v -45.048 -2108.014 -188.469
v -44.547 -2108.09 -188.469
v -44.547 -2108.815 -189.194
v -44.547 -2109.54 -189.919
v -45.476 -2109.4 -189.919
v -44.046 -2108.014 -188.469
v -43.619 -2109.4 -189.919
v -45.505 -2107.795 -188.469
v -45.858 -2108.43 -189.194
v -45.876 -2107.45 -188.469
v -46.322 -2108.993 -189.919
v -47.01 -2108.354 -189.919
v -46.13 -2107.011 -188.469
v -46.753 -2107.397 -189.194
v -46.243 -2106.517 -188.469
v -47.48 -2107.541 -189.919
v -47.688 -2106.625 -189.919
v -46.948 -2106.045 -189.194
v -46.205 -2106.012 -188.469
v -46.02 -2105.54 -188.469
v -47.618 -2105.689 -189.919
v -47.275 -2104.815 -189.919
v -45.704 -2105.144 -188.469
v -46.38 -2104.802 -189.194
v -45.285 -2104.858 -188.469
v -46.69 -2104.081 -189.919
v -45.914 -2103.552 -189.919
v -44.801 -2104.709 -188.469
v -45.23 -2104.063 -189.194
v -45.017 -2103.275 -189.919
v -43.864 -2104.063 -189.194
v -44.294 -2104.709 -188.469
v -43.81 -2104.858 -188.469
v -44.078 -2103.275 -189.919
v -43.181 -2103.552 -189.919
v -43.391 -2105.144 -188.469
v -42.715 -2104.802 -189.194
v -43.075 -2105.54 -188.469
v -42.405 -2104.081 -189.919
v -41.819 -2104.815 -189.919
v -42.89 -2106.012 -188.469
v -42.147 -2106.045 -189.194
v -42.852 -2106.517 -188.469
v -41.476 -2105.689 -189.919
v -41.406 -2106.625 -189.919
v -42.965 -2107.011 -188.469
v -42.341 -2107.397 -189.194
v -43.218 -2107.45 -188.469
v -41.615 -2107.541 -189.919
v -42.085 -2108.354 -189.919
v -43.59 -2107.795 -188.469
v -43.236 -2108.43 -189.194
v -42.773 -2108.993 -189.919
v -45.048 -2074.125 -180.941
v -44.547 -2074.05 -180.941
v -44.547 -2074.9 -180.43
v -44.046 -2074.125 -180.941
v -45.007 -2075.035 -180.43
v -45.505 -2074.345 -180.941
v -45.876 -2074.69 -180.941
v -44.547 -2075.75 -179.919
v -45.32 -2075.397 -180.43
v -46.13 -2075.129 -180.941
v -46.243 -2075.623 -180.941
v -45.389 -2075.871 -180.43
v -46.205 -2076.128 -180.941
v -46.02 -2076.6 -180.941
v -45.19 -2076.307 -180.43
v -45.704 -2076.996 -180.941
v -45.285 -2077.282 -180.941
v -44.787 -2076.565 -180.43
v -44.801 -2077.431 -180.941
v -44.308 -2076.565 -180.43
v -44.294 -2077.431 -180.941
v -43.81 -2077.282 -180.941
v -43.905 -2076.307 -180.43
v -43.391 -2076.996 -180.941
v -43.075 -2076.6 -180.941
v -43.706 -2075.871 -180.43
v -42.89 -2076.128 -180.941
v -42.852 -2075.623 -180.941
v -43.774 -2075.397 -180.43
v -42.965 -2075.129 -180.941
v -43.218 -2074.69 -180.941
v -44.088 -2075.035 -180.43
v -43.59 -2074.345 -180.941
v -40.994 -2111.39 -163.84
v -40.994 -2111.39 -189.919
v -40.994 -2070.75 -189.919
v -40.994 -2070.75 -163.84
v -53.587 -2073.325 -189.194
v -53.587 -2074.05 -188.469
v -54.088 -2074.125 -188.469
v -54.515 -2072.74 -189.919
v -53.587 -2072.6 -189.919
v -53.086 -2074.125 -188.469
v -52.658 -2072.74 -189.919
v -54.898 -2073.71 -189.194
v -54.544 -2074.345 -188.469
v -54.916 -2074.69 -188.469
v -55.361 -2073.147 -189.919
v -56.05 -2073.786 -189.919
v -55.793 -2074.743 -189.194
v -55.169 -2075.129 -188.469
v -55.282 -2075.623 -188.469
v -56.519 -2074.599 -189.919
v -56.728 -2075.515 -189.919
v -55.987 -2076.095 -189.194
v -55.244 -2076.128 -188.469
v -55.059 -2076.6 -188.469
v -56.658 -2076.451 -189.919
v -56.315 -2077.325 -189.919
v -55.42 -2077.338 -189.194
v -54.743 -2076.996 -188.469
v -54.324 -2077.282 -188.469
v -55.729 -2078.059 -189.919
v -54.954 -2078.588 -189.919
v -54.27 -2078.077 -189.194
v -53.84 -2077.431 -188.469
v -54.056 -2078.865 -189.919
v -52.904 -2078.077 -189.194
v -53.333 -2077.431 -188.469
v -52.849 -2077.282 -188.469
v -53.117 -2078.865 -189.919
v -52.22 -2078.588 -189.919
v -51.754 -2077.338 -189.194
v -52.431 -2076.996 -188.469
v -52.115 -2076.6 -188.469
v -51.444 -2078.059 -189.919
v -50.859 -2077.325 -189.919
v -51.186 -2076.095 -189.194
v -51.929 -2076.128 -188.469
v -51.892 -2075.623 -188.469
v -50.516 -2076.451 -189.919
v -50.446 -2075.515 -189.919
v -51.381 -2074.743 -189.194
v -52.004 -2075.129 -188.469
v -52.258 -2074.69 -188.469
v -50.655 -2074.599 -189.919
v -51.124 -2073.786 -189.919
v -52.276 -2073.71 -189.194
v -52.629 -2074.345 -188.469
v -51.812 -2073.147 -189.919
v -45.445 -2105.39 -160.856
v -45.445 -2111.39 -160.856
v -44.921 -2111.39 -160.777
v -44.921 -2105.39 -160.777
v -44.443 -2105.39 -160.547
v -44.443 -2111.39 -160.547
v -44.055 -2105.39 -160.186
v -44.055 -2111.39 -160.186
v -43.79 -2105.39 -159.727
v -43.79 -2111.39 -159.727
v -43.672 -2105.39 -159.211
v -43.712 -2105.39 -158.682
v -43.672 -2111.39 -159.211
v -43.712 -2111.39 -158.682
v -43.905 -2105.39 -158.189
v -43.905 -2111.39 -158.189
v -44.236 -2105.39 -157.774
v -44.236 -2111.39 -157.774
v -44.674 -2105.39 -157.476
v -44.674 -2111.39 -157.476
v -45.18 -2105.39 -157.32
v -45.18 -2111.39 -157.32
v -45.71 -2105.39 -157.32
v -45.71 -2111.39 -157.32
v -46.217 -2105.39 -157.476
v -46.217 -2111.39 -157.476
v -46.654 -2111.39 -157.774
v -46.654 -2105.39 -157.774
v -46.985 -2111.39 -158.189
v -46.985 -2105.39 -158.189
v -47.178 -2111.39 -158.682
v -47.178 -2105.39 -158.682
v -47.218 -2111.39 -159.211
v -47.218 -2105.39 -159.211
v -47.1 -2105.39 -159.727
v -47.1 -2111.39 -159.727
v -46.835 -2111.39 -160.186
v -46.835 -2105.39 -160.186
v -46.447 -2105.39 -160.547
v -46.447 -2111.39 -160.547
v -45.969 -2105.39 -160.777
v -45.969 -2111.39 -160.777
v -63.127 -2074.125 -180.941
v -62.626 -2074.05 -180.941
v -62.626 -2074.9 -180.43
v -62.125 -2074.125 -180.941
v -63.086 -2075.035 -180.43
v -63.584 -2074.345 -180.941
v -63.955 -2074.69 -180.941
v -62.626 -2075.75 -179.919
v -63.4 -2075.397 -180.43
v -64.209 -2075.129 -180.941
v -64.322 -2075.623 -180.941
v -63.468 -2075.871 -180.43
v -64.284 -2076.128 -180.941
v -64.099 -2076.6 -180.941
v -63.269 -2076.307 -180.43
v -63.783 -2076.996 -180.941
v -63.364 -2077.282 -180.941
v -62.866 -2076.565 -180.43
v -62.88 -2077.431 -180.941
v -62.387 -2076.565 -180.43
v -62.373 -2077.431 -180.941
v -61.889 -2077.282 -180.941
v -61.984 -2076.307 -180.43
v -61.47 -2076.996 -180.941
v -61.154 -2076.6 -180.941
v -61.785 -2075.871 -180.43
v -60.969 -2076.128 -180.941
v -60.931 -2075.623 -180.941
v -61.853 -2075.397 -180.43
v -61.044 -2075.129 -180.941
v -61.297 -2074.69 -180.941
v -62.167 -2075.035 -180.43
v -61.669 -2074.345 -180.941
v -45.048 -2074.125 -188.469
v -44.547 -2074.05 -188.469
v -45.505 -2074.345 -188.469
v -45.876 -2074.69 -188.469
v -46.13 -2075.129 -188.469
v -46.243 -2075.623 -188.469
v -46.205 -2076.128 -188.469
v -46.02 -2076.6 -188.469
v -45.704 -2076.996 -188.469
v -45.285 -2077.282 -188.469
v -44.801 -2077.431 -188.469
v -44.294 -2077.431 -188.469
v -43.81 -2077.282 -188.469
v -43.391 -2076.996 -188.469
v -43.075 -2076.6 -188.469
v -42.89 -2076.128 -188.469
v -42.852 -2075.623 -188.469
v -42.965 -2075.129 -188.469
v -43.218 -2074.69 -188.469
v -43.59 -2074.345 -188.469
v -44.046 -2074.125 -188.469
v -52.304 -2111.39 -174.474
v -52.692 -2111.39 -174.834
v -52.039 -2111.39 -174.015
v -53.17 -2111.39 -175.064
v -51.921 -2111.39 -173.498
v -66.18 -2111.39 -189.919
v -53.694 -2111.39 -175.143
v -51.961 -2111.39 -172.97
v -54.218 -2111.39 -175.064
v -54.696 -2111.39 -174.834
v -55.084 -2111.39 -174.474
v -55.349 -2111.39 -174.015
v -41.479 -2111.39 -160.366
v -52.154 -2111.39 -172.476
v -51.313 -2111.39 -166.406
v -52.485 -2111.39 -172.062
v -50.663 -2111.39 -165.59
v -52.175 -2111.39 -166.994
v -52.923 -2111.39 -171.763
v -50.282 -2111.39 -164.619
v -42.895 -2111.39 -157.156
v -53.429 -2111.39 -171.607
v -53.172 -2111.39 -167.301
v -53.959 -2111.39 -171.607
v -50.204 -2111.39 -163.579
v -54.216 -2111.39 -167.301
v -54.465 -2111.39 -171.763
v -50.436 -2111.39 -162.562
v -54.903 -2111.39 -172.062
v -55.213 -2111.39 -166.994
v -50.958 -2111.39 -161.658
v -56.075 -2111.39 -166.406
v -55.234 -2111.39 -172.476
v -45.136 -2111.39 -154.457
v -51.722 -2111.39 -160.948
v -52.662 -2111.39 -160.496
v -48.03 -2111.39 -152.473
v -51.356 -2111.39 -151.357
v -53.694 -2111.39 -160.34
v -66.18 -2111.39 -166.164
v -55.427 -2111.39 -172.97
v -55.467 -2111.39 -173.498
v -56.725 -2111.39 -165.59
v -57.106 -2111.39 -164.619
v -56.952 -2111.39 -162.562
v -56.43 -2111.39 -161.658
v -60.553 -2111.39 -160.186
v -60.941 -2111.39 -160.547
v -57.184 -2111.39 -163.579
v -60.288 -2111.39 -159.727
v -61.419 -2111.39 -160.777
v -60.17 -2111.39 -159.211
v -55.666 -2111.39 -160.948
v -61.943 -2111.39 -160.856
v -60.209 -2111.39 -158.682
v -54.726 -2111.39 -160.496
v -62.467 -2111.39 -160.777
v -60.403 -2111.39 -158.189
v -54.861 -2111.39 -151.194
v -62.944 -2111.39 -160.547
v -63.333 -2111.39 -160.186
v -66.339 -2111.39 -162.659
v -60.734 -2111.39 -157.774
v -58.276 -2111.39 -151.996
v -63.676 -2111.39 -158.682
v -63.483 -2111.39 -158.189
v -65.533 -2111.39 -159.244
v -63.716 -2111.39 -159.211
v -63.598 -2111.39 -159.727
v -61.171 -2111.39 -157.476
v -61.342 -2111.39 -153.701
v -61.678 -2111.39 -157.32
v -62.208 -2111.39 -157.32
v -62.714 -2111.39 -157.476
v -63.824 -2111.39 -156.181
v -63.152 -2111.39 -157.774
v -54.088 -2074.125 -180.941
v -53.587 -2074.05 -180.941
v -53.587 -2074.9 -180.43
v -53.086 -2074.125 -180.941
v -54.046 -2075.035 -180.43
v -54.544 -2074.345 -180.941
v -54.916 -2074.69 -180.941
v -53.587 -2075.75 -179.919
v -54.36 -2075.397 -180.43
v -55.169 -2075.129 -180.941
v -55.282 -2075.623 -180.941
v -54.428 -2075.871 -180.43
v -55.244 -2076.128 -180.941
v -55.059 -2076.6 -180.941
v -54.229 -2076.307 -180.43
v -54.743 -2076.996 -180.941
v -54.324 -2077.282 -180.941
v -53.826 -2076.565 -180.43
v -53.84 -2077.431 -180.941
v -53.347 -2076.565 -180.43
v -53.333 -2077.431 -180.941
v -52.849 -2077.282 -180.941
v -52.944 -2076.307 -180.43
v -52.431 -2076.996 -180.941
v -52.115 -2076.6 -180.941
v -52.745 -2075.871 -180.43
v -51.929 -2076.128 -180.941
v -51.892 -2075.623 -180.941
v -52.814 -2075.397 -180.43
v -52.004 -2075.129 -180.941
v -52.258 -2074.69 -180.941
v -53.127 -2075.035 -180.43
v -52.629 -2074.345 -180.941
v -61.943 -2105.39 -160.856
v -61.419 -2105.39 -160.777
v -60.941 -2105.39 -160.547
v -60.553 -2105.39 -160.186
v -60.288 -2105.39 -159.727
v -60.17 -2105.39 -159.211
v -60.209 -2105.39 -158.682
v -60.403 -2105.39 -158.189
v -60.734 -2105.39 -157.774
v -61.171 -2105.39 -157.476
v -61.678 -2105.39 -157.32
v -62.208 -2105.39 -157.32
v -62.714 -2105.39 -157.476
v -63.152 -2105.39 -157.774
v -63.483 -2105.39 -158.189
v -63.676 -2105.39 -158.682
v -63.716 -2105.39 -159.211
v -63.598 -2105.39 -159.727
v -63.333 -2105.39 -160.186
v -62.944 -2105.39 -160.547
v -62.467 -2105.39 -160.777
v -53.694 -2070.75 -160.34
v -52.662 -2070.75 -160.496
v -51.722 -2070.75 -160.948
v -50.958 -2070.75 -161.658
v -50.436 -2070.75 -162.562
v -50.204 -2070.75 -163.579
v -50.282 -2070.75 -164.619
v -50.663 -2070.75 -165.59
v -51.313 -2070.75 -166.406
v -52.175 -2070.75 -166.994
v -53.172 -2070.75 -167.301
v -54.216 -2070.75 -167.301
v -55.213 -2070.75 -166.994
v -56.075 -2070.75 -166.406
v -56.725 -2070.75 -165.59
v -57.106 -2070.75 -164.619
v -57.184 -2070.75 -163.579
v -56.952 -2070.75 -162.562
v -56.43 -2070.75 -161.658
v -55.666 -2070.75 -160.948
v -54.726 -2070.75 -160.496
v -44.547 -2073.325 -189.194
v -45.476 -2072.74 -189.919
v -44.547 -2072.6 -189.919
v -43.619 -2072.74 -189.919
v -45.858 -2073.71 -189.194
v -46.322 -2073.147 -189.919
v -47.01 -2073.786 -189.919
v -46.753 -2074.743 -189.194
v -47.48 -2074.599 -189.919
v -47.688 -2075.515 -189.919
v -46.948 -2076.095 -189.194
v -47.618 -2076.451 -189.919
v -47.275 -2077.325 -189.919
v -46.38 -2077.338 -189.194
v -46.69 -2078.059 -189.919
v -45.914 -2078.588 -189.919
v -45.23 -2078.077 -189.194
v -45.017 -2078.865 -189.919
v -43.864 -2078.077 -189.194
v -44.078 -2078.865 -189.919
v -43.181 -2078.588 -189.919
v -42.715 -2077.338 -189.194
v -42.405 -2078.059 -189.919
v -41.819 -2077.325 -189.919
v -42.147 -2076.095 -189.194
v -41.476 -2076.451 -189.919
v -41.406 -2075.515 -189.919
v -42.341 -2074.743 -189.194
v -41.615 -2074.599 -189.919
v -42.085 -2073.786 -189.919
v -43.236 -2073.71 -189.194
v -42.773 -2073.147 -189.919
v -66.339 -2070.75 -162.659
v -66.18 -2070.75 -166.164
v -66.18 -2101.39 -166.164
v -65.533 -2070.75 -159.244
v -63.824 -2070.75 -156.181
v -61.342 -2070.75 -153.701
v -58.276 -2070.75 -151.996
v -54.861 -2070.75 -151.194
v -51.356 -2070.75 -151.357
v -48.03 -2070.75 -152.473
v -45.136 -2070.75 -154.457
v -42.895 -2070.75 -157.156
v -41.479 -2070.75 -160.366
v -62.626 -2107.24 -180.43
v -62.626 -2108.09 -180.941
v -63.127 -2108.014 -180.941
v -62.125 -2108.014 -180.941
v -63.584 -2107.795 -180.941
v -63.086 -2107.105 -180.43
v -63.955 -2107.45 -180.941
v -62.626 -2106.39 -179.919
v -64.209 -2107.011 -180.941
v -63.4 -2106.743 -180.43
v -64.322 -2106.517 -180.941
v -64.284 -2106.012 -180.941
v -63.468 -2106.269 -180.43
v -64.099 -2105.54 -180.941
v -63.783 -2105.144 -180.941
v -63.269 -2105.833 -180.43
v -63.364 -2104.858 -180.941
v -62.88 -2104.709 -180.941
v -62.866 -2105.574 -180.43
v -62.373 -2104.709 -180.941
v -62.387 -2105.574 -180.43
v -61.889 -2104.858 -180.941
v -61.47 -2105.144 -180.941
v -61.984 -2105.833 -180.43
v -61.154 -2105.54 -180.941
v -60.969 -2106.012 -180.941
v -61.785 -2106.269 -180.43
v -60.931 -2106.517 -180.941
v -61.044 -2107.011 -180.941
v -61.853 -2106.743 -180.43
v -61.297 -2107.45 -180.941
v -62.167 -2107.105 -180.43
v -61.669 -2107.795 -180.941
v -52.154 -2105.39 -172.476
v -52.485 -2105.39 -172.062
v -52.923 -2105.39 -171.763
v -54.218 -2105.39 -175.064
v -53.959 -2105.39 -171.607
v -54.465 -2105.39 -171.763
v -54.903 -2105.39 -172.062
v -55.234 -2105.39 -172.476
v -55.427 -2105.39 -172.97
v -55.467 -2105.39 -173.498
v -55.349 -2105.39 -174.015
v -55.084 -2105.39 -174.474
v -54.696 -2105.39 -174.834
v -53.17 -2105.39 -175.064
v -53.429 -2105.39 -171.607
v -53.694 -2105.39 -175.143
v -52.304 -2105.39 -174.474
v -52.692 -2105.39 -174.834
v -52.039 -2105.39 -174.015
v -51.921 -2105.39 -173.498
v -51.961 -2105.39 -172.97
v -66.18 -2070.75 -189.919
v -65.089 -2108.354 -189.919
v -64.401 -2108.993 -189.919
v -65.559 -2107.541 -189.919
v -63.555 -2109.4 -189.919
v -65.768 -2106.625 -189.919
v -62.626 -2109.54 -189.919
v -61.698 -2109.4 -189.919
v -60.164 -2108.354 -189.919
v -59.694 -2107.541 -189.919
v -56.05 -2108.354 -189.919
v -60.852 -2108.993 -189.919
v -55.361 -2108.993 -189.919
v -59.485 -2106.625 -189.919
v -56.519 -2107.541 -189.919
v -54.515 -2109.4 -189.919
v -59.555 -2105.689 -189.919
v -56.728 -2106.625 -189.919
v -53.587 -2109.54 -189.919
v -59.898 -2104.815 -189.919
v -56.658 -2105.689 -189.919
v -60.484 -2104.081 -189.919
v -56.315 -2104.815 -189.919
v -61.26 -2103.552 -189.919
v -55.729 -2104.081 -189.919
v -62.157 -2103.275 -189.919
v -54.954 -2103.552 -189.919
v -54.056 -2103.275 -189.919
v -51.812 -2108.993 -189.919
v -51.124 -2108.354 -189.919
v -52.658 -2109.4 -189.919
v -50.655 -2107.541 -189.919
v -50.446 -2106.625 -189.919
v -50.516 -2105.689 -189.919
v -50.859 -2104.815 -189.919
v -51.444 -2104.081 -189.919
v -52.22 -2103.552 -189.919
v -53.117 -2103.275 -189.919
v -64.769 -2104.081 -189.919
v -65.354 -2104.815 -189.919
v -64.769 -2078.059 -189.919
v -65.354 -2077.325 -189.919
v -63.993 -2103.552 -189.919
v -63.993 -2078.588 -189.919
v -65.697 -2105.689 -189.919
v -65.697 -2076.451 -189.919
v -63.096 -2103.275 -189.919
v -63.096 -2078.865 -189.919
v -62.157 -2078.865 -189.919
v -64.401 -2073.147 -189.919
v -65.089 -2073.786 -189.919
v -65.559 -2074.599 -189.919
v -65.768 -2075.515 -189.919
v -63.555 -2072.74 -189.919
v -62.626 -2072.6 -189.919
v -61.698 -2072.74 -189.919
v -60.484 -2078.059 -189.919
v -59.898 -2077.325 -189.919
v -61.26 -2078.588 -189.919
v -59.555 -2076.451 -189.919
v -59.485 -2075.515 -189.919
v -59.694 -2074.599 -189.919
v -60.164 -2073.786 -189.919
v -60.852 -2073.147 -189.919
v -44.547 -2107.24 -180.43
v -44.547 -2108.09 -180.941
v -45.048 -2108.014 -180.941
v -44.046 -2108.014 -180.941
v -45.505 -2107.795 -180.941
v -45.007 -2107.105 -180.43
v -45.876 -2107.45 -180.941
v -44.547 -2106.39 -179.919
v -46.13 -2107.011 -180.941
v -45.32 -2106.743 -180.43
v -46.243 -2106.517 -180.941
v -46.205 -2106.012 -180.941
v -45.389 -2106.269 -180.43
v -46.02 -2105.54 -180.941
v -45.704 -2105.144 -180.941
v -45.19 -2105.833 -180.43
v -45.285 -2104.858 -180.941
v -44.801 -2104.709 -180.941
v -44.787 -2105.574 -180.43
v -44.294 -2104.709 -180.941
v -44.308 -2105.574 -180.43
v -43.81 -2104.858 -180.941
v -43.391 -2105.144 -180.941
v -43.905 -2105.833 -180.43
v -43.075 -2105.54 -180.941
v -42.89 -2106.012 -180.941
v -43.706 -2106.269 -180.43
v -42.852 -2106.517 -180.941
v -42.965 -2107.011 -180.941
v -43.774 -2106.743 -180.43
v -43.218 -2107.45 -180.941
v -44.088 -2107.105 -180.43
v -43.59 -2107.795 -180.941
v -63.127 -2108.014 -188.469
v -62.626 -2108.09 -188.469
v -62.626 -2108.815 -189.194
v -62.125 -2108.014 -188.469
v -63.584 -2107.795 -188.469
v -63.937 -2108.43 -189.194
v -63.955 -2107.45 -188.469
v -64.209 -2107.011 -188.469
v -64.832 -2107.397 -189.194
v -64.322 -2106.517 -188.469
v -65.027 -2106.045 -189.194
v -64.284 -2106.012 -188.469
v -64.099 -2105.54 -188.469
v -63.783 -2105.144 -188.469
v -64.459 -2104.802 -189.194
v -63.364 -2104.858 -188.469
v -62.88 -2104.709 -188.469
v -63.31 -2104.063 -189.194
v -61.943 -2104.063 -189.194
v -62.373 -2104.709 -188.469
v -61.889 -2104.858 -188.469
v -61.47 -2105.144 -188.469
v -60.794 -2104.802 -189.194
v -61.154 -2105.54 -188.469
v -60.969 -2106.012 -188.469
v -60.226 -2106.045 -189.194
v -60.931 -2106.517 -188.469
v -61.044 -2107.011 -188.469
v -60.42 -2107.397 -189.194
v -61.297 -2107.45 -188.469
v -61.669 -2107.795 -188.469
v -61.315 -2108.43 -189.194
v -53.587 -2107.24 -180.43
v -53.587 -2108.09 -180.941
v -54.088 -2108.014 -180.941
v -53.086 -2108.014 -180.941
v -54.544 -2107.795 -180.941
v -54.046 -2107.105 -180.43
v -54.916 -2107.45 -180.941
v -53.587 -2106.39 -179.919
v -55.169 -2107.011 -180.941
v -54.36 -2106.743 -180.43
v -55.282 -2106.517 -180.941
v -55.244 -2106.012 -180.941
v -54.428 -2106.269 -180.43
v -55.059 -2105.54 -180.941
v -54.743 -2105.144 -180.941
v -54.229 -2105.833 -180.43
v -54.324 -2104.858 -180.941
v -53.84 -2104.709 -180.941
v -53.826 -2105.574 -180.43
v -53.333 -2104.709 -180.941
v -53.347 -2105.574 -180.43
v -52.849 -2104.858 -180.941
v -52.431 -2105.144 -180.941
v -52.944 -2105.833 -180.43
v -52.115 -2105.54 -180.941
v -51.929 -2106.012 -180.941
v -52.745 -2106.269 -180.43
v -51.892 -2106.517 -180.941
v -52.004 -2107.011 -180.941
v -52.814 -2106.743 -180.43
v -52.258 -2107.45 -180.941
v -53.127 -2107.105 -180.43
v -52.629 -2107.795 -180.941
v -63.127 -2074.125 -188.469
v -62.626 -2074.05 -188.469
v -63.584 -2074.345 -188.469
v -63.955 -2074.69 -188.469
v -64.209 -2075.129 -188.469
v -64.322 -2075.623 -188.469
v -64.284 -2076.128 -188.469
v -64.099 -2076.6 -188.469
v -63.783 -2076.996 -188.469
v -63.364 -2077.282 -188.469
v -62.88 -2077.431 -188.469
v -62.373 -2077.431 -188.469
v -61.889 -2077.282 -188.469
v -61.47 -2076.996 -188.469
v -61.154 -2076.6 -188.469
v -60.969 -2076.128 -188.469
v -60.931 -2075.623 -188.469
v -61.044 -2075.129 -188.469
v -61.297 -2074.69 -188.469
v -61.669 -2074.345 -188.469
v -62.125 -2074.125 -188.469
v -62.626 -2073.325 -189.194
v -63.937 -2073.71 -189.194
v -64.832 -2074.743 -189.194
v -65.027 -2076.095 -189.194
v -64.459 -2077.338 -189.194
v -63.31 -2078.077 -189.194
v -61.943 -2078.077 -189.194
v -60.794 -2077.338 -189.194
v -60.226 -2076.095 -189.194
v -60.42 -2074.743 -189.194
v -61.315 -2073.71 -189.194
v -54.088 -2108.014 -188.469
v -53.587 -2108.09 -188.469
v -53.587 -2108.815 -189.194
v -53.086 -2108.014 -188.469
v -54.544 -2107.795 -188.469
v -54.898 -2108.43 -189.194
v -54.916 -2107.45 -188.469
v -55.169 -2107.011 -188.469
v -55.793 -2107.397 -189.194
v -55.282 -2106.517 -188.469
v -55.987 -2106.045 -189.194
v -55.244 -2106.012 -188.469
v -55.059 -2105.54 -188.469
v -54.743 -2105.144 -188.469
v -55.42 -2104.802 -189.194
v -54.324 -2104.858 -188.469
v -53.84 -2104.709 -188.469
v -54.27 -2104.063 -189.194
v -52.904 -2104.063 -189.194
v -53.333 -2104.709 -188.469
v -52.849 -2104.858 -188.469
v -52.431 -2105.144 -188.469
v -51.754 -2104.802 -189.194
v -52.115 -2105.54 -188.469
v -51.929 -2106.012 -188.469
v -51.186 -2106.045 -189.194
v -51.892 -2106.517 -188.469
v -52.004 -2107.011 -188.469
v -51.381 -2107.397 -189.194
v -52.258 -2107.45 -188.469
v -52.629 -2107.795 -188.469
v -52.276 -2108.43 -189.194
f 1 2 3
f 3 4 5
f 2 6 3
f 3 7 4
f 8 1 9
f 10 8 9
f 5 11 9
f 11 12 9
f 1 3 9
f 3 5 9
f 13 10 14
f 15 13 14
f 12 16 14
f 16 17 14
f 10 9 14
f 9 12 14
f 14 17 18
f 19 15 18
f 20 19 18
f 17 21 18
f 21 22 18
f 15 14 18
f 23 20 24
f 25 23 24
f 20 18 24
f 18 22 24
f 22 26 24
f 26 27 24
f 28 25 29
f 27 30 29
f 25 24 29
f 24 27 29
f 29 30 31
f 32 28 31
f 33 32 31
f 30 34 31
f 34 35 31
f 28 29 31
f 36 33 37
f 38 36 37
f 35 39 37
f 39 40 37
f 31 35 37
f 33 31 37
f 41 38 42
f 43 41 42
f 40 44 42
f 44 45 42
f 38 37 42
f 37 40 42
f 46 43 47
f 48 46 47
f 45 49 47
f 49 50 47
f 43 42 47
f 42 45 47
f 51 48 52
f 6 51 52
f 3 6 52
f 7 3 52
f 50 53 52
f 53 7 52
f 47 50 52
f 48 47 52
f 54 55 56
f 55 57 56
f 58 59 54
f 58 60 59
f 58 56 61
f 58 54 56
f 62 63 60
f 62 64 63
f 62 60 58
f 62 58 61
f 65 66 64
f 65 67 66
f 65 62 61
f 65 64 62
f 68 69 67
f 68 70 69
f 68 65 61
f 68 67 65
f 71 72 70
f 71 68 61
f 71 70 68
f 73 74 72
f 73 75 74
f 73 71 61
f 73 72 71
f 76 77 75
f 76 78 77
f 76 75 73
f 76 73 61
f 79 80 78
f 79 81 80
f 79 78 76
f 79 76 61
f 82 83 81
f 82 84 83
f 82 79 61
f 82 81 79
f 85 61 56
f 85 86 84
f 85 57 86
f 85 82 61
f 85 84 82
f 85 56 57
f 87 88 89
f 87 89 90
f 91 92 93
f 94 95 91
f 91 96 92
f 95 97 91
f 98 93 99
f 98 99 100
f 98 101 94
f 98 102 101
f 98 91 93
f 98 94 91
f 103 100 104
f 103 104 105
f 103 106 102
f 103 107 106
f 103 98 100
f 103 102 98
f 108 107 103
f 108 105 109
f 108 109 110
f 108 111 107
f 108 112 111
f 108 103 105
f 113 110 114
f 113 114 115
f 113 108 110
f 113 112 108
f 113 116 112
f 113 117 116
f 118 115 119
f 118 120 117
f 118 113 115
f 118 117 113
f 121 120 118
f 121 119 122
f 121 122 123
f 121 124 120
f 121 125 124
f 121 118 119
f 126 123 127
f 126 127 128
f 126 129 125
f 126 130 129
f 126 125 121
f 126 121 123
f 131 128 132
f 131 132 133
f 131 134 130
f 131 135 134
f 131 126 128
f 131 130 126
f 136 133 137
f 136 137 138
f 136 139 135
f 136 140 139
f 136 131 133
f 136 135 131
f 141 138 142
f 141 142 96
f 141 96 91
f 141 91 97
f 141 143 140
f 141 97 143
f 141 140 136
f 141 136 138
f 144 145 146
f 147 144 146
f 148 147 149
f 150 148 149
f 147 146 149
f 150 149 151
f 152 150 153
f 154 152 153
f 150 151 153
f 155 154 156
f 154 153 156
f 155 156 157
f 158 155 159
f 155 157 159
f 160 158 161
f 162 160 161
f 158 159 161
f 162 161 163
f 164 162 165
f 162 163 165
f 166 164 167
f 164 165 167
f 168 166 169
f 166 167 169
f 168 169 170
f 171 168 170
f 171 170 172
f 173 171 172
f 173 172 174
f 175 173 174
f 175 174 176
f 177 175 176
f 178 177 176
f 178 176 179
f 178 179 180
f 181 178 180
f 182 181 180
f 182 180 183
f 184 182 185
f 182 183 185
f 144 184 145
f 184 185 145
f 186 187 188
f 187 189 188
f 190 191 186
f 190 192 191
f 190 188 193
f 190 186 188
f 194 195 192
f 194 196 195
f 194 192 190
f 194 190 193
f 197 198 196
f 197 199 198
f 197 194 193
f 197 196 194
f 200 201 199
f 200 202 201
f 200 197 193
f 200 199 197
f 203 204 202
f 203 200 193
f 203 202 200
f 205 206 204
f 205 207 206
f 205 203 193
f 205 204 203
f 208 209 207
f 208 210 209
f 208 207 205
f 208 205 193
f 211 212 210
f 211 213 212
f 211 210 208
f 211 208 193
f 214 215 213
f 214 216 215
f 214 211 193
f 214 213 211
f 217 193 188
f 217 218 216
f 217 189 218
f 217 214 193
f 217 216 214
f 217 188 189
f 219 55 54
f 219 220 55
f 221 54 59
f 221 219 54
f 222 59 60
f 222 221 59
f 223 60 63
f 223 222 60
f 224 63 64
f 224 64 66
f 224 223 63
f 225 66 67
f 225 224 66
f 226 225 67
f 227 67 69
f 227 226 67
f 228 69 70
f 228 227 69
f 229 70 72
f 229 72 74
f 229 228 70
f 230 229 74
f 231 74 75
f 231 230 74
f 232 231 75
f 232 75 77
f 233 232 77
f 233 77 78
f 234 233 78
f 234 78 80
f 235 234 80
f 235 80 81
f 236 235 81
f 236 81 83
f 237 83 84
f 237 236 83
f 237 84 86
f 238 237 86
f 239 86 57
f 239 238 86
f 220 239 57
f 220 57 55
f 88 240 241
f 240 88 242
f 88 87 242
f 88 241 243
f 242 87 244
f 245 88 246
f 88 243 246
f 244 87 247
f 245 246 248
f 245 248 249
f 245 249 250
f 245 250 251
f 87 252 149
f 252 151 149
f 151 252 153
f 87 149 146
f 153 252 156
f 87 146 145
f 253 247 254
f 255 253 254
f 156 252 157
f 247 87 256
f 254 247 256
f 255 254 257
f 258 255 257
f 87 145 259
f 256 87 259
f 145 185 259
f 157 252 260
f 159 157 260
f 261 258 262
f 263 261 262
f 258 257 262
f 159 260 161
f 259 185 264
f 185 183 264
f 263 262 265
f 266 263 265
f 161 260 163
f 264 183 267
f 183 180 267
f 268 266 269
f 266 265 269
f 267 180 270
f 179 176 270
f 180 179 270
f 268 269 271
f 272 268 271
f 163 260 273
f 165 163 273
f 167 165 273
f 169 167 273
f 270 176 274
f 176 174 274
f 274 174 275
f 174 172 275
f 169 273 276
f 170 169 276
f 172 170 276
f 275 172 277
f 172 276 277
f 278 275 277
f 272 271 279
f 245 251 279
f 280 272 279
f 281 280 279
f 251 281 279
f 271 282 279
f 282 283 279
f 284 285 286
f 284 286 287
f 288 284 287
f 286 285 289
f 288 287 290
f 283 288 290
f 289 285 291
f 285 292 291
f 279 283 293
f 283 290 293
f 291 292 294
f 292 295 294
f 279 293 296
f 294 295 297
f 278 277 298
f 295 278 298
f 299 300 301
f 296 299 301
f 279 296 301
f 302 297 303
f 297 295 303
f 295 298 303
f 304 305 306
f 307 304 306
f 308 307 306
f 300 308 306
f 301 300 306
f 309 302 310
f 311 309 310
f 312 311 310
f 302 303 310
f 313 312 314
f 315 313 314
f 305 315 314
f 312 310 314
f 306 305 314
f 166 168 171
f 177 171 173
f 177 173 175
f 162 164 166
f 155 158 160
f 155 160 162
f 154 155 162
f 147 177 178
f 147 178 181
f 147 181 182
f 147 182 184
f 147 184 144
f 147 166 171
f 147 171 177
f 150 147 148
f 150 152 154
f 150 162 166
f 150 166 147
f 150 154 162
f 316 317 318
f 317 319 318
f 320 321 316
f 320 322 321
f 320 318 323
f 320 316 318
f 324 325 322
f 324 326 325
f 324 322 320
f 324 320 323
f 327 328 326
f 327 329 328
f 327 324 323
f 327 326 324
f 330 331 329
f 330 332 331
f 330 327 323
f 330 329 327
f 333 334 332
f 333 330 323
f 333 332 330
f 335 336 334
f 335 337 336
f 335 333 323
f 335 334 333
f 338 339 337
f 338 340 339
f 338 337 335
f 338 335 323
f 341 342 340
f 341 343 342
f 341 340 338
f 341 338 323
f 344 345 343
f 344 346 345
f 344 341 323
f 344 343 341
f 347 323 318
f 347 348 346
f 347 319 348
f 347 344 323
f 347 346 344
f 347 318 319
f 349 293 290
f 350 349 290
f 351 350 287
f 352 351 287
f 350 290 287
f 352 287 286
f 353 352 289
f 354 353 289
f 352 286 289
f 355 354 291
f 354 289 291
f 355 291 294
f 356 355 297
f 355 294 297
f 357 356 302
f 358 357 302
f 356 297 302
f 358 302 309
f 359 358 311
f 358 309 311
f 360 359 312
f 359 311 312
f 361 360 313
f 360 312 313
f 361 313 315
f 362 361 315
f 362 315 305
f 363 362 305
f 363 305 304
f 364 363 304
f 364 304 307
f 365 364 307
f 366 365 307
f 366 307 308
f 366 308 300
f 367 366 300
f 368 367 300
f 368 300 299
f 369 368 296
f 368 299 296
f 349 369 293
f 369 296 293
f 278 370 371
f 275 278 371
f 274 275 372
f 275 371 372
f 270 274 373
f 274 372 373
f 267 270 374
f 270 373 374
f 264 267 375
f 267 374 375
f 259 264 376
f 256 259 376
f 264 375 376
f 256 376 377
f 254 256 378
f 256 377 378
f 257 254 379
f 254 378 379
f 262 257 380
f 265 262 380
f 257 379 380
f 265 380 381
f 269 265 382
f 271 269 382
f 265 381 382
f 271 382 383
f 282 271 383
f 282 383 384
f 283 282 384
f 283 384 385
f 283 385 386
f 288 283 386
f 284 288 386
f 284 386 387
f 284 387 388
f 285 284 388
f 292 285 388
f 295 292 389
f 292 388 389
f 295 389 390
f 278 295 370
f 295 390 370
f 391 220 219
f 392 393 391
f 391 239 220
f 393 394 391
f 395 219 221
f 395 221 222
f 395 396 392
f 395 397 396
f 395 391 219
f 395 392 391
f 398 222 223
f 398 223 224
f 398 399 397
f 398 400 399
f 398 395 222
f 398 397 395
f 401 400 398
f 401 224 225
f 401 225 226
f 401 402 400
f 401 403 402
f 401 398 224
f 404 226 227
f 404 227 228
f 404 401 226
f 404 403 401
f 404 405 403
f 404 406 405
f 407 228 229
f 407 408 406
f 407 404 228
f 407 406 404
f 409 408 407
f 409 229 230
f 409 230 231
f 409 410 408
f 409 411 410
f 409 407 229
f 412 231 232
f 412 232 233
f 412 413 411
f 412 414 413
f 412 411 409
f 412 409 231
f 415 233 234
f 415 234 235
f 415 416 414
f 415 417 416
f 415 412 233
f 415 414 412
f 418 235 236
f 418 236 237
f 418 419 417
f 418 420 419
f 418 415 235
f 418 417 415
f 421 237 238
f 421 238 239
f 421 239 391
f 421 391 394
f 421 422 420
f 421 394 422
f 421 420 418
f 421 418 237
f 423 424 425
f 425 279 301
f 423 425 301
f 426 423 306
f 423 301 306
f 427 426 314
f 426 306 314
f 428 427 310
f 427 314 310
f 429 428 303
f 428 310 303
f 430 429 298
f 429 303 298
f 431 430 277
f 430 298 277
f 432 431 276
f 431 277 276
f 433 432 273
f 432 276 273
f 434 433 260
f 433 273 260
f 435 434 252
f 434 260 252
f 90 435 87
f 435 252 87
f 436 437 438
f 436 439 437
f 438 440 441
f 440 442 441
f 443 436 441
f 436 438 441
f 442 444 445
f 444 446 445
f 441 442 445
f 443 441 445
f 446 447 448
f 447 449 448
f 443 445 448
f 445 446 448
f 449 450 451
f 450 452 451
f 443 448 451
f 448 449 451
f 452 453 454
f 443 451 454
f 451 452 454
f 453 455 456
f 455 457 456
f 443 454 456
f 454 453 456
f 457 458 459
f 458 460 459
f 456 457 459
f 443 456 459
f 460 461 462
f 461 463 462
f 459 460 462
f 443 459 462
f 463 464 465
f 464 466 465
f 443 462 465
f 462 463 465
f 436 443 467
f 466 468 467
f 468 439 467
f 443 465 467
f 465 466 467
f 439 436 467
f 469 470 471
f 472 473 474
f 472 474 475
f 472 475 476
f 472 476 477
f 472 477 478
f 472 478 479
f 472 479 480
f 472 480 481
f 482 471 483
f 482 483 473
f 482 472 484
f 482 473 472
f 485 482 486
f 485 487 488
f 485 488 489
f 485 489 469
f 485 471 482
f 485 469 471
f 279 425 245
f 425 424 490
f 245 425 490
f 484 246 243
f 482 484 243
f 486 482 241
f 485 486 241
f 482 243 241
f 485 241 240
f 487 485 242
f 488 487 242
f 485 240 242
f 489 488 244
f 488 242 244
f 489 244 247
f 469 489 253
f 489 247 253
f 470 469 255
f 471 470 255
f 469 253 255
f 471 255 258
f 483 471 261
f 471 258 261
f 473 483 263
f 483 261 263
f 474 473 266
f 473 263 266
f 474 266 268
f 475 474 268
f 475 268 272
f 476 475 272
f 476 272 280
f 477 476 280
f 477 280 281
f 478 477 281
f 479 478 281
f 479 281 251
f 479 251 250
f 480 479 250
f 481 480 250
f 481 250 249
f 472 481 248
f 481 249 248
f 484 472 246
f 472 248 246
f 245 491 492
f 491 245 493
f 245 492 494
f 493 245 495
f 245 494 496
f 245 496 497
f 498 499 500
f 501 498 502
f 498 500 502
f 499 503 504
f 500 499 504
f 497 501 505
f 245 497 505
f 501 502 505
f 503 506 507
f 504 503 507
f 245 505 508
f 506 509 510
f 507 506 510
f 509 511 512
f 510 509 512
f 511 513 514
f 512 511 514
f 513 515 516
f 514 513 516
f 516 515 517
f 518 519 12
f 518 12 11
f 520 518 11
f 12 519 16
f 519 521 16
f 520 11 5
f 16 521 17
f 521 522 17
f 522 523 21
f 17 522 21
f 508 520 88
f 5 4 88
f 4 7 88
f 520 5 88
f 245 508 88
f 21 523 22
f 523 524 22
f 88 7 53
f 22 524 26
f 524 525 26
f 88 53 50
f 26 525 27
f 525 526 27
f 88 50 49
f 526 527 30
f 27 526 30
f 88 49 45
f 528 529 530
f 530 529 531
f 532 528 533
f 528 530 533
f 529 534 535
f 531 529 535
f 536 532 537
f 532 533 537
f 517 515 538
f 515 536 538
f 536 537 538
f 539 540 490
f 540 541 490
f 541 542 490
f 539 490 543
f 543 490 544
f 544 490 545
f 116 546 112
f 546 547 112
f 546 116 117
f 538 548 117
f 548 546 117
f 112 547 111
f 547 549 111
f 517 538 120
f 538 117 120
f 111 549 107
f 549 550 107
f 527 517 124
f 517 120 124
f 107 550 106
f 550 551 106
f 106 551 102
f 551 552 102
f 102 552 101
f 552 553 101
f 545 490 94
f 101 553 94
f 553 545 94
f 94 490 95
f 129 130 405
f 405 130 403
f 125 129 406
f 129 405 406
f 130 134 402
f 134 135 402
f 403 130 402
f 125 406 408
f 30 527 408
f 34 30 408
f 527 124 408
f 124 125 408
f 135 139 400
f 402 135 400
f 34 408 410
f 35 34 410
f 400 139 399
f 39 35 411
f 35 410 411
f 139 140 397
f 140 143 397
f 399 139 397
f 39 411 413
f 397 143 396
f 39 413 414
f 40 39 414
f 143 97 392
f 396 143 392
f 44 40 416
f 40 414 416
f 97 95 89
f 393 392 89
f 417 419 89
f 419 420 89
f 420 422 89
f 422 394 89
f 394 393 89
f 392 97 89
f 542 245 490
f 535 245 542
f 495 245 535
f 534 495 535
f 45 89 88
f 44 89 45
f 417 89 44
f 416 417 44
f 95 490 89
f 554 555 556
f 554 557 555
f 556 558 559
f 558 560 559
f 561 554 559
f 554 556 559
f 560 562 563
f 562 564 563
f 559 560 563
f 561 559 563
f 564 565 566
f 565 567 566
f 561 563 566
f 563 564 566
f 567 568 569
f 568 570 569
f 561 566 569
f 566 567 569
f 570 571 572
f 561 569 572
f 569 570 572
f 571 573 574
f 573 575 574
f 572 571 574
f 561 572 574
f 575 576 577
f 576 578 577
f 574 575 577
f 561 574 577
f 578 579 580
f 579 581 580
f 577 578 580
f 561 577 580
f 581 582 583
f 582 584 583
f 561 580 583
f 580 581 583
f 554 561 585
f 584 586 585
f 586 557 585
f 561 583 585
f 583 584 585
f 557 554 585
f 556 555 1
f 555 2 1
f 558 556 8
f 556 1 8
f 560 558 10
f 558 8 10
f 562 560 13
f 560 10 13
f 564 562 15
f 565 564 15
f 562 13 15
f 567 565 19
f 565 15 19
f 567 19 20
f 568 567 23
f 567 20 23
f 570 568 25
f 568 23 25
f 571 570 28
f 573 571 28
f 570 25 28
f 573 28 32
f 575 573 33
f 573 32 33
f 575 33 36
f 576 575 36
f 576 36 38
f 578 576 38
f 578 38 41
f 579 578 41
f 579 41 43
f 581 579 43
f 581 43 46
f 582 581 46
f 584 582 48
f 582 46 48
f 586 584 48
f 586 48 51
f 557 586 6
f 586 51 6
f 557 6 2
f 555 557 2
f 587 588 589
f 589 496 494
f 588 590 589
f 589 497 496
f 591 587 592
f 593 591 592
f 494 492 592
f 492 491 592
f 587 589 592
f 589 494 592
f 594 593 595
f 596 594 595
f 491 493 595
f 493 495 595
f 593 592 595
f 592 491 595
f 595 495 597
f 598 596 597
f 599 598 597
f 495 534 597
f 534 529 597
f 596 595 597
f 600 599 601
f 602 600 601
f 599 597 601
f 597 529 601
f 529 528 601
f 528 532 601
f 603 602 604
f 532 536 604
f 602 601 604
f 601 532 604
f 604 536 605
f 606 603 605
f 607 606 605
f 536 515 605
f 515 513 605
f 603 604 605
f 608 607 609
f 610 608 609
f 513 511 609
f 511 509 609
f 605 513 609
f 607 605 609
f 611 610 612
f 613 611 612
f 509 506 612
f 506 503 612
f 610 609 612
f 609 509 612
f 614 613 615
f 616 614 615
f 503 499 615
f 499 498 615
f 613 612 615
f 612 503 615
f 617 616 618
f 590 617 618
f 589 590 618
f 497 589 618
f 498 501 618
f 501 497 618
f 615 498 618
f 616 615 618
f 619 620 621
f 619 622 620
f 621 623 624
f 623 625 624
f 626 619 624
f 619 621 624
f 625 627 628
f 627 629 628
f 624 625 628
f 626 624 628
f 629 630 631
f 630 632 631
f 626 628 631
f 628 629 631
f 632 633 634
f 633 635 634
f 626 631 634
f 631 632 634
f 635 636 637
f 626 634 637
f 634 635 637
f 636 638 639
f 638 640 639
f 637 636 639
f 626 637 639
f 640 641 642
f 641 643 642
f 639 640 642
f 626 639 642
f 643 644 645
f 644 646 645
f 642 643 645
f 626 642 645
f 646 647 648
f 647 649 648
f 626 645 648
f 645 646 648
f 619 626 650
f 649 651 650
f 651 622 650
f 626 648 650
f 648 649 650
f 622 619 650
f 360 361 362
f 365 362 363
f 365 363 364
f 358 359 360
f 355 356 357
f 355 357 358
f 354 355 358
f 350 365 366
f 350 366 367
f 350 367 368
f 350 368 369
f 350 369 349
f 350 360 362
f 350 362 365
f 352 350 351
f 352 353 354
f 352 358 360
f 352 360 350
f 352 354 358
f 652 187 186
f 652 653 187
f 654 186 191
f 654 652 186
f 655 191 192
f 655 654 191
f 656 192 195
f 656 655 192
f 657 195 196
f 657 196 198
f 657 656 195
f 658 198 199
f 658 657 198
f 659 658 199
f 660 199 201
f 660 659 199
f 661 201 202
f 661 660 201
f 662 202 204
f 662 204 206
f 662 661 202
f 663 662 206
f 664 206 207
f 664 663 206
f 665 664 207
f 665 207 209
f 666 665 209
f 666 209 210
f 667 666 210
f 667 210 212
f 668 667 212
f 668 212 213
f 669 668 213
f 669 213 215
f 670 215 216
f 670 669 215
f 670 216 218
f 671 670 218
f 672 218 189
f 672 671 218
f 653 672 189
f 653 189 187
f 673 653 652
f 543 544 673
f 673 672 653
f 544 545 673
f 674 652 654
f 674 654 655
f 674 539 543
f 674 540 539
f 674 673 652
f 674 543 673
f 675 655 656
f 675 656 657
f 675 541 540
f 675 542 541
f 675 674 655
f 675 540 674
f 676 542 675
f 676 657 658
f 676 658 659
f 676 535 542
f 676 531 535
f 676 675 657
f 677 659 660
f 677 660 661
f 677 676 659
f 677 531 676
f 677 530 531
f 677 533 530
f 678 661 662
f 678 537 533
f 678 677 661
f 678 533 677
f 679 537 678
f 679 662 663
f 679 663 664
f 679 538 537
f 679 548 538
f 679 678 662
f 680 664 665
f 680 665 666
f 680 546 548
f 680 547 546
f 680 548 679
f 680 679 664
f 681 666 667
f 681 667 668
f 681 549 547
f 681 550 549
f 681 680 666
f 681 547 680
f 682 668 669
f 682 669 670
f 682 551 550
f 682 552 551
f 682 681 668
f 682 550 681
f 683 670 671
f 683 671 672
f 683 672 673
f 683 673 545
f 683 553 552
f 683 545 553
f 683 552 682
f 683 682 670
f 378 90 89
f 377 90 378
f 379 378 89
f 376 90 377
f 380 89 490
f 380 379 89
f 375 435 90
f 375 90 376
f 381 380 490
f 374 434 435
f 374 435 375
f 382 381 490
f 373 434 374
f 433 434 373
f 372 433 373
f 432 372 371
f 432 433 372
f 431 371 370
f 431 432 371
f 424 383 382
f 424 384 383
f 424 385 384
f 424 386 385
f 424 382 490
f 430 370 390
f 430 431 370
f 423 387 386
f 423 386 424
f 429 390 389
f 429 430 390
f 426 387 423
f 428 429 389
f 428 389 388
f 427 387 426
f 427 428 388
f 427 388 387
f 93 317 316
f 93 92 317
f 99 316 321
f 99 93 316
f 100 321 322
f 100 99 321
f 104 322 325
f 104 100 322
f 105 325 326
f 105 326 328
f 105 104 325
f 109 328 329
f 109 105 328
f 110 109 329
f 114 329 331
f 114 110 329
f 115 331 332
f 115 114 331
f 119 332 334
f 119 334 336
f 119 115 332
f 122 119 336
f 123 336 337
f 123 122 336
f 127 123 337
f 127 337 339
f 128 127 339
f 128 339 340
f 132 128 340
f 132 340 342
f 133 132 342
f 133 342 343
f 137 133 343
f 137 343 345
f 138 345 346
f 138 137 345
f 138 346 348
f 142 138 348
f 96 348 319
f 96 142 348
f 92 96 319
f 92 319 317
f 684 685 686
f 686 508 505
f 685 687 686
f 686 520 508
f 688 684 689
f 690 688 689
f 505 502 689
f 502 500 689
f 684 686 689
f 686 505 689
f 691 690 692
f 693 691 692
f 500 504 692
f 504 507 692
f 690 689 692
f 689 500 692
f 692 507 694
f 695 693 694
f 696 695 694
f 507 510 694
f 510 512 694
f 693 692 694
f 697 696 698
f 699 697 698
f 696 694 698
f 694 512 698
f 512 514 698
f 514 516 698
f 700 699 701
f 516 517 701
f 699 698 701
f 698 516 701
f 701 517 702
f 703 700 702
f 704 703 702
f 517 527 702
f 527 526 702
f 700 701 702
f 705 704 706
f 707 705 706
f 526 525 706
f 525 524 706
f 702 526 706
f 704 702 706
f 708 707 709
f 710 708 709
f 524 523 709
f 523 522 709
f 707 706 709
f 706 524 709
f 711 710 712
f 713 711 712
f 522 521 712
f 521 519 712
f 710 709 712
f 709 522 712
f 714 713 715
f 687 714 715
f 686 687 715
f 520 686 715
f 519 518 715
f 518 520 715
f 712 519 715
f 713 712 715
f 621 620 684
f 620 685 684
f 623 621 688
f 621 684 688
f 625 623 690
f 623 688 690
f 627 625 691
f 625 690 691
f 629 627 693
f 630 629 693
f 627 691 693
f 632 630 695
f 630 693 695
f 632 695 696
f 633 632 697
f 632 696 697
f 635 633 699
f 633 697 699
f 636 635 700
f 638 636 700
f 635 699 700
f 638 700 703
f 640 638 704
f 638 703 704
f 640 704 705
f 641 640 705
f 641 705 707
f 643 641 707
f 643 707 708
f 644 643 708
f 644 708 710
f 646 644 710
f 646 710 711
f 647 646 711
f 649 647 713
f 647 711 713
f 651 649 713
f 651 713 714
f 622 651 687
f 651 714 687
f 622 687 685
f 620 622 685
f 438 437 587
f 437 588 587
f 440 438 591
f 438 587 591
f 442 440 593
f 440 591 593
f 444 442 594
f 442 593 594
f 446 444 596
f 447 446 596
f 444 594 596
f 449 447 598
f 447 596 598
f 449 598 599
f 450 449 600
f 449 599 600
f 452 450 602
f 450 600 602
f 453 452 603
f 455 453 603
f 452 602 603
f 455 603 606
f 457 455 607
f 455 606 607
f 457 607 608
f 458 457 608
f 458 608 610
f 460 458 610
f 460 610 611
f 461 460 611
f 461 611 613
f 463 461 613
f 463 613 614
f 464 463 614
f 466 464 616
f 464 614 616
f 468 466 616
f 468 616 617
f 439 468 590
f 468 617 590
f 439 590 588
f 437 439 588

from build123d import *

# Parameters (mm, degrees)
SKETCH2_R                                      = 12.7
BOSS_EXTRUDE6_DEPTH                            = 40.64
SKETCH3_R                                      = 3.5
CUT_EXTRUDE1_DEPTH                             = 40.64
SKETCH4_R                                      = 1.778
CUT_EXTRUDE2_DEPTH                             = 6
BOSS_EXTRUDE8_DEPTH                            = 10
SKETCH8_W                                      = 25.185693912
SKETCH8_H                                      = 10
BOSS_EXTRUDE9_DEPTH                            = 7.284789049
BOSS_EXTRUDE10_DEPTH                           = 30.64
CSK_FOR_M3_FLAT_HEAD_MACHINE_SCREW1_AT_2_COUNT = 2
CSK_FOR_M3_FLAT_HEAD_MACHINE_SCREW1_AT_2_PITCH = 9.039543014
CSK_FOR_M3_FLAT_HEAD_MACHINE_SCREW1_AT_3_COUNT = 2
CSK_FOR_M3_FLAT_HEAD_MACHINE_SCREW1_AT_3_PITCH = 9.039543014


with BuildPart() as part:
    # Sketch2 → Boss-Extrude6 (new body)
    with BuildSketch(Plane(origin=(0, -2111.389926236, 0), x_dir=(1, 0, 0), z_dir=(0, 1, 0))):
        with Locations(Location((-53.693967541, 163.840329354, 0), (0, 0, 180))):
            Circle(SKETCH2_R)
    extrude(amount=BOSS_EXTRUDE6_DEPTH)

    # Sketch3 → Cut-Extrude1 (cut)
    with BuildSketch(Plane(origin=(0, -2070.749926236, 0), x_dir=(1, 0, 0), z_dir=(0, 1, 0))):
        with Locations(Location((-53.693967541, 163.840329354, 0), (0, 0, 270))):
            Circle(SKETCH3_R)
    extrude(amount=-CUT_EXTRUDE1_DEPTH, mode=Mode.SUBTRACT)

    # Sketch4 → Cut-Extrude2 (cut)
    with BuildSketch(Plane.XZ.offset(2111.389926236)):
        with Locations(Location((-61.942859512, -159.077829354, 0), (0, 0, 270))):
            Circle(SKETCH4_R)
        with Locations(Location((-53.693967541, -173.365329354, 0), (0, 0, 270))):
            Circle(SKETCH4_R)
        with Locations(Location((-45.44507557, -159.077829354, 0), (0, 0, 270))):
            Circle(SKETCH4_R)
    extrude(amount=-CUT_EXTRUDE2_DEPTH, mode=Mode.SUBTRACT)

    # Sketch7 → Boss-Extrude8 (add)
    with BuildSketch(Plane.XZ.offset(2111.389926236)):
        with BuildLine():
            Line((-40.993967541, -163.840329354), (-40.993967541, -182.634287878))
            Line((-40.993967541, -182.634287878), (-66.179661453, -182.634287878))
            Line((-66.179661453, -182.634287878), (-66.179661453, -166.163570095))
            ThreePointArc((-66.179661453, -166.163570095), (-52.527415502, -176.486639343), (-40.993967541, -163.840329354))
        make_face()
    extrude(amount=-BOSS_EXTRUDE8_DEPTH)

    # Sketch8 → Boss-Extrude9 (add)
    with BuildSketch(Plane(origin=(0, 0, -182.634287878), x_dir=(-1, 0, 0), z_dir=(0, 0, -1))):
        with Locations((53.586814497, -2106.389926236)):
            Rectangle(SKETCH8_W, SKETCH8_H)
    extrude(amount=BOSS_EXTRUDE9_DEPTH)

    # Sketch9 → Boss-Extrude10 (add)
    with BuildSketch(Plane(origin=(0, -2070.749926236, 0), x_dir=(1, 0, 0), z_dir=(0, 1, 0))):
        with BuildLine():
            Line((-66.179661453, 163.840329354), (-66.179661453, 189.919076927))
            Line((-66.179661453, 189.919076927), (-40.993967541, 189.919076927))
            Line((-40.993967541, 189.919076927), (-40.993967541, 163.840329354))
            ThreePointArc((-40.993967541, 163.840329354), (-53.586814497, 176.43317631), (-66.179661453, 163.840329354))
        make_face()
    extrude(amount=-BOSS_EXTRUDE10_DEPTH)

    # Sketch15 → CSK for M3 Flat Head Machine Screw1 (revolve, cut)
    with BuildSketch(Plane(origin=(-53.586814498, -2075.749926236, -189.919076927), x_dir=(0, 1, 0), z_dir=(1, 0, 0))):
        Polygon((0, 0), (0, 10), (1.7, 8.978536948), (1.7, 1.45), (3.15, 0), align=None)
    csk_for_m3_flat_head_machine_screw1 = revolve(axis=Axis((-53.586814498, -2075.749926236, -196.269076927), (0, 0, 1)), mode=Mode.SUBTRACT)

    # CSK for M3 Flat Head Machine Screw1 at 2: CSK for M3 Flat Head Machine Screw1 ×2
    with Locations(*[(-i * CSK_FOR_M3_FLAT_HEAD_MACHINE_SCREW1_AT_2_PITCH, 0, 0) for i in range(1, CSK_FOR_M3_FLAT_HEAD_MACHINE_SCREW1_AT_2_COUNT)]):
        add(csk_for_m3_flat_head_machine_screw1, mode=Mode.SUBTRACT)

    # CSK for M3 Flat Head Machine Screw1 at 3: CSK for M3 Flat Head Machine Screw1 ×2
    with Locations(*[(i * CSK_FOR_M3_FLAT_HEAD_MACHINE_SCREW1_AT_3_PITCH, 0, 0) for i in range(1, CSK_FOR_M3_FLAT_HEAD_MACHINE_SCREW1_AT_3_COUNT)]):
        add(csk_for_m3_flat_head_machine_screw1, mode=Mode.SUBTRACT)

    # Mirror1: CSK for M3 Flat Head Machine Screw1 across plane
    add(csk_for_m3_flat_head_machine_screw1.mirror(Plane.ZX.offset(-2091.069926234)), mode=Mode.SUBTRACT)

    # Mirror1 copy 1 sketch → Mirror1 copy 1 (revolve, cut)
    with BuildSketch(Plane(origin=(-62.626357512, -2106.389926232, -189.919076927), x_dir=(0, -1, 0), z_dir=(1, 0, 0))):
        Polygon((0, 0), (0, -10), (1.7, -8.978536948), (1.7, -1.45), (3.15, 0), align=None)
    revolve(axis=Axis((-62.626357512, -2106.389926232, -196.269076927), (0, 0, -1)), mode=Mode.SUBTRACT)

    # Mirror1 copy 2 sketch → Mirror1 copy 2 (revolve, cut)
    with BuildSketch(Plane(origin=(-44.547271484, -2106.389926232, -189.919076927), x_dir=(0, -1, 0), z_dir=(1, 0, 0))):
        Polygon((0, 0), (0, -10), (1.7, -8.978536948), (1.7, -1.45), (3.15, 0), align=None)
    revolve(axis=Axis((-44.547271484, -2106.389926232, -196.269076927), (0, 0, -1)), mode=Mode.SUBTRACT)


solid = part.part
